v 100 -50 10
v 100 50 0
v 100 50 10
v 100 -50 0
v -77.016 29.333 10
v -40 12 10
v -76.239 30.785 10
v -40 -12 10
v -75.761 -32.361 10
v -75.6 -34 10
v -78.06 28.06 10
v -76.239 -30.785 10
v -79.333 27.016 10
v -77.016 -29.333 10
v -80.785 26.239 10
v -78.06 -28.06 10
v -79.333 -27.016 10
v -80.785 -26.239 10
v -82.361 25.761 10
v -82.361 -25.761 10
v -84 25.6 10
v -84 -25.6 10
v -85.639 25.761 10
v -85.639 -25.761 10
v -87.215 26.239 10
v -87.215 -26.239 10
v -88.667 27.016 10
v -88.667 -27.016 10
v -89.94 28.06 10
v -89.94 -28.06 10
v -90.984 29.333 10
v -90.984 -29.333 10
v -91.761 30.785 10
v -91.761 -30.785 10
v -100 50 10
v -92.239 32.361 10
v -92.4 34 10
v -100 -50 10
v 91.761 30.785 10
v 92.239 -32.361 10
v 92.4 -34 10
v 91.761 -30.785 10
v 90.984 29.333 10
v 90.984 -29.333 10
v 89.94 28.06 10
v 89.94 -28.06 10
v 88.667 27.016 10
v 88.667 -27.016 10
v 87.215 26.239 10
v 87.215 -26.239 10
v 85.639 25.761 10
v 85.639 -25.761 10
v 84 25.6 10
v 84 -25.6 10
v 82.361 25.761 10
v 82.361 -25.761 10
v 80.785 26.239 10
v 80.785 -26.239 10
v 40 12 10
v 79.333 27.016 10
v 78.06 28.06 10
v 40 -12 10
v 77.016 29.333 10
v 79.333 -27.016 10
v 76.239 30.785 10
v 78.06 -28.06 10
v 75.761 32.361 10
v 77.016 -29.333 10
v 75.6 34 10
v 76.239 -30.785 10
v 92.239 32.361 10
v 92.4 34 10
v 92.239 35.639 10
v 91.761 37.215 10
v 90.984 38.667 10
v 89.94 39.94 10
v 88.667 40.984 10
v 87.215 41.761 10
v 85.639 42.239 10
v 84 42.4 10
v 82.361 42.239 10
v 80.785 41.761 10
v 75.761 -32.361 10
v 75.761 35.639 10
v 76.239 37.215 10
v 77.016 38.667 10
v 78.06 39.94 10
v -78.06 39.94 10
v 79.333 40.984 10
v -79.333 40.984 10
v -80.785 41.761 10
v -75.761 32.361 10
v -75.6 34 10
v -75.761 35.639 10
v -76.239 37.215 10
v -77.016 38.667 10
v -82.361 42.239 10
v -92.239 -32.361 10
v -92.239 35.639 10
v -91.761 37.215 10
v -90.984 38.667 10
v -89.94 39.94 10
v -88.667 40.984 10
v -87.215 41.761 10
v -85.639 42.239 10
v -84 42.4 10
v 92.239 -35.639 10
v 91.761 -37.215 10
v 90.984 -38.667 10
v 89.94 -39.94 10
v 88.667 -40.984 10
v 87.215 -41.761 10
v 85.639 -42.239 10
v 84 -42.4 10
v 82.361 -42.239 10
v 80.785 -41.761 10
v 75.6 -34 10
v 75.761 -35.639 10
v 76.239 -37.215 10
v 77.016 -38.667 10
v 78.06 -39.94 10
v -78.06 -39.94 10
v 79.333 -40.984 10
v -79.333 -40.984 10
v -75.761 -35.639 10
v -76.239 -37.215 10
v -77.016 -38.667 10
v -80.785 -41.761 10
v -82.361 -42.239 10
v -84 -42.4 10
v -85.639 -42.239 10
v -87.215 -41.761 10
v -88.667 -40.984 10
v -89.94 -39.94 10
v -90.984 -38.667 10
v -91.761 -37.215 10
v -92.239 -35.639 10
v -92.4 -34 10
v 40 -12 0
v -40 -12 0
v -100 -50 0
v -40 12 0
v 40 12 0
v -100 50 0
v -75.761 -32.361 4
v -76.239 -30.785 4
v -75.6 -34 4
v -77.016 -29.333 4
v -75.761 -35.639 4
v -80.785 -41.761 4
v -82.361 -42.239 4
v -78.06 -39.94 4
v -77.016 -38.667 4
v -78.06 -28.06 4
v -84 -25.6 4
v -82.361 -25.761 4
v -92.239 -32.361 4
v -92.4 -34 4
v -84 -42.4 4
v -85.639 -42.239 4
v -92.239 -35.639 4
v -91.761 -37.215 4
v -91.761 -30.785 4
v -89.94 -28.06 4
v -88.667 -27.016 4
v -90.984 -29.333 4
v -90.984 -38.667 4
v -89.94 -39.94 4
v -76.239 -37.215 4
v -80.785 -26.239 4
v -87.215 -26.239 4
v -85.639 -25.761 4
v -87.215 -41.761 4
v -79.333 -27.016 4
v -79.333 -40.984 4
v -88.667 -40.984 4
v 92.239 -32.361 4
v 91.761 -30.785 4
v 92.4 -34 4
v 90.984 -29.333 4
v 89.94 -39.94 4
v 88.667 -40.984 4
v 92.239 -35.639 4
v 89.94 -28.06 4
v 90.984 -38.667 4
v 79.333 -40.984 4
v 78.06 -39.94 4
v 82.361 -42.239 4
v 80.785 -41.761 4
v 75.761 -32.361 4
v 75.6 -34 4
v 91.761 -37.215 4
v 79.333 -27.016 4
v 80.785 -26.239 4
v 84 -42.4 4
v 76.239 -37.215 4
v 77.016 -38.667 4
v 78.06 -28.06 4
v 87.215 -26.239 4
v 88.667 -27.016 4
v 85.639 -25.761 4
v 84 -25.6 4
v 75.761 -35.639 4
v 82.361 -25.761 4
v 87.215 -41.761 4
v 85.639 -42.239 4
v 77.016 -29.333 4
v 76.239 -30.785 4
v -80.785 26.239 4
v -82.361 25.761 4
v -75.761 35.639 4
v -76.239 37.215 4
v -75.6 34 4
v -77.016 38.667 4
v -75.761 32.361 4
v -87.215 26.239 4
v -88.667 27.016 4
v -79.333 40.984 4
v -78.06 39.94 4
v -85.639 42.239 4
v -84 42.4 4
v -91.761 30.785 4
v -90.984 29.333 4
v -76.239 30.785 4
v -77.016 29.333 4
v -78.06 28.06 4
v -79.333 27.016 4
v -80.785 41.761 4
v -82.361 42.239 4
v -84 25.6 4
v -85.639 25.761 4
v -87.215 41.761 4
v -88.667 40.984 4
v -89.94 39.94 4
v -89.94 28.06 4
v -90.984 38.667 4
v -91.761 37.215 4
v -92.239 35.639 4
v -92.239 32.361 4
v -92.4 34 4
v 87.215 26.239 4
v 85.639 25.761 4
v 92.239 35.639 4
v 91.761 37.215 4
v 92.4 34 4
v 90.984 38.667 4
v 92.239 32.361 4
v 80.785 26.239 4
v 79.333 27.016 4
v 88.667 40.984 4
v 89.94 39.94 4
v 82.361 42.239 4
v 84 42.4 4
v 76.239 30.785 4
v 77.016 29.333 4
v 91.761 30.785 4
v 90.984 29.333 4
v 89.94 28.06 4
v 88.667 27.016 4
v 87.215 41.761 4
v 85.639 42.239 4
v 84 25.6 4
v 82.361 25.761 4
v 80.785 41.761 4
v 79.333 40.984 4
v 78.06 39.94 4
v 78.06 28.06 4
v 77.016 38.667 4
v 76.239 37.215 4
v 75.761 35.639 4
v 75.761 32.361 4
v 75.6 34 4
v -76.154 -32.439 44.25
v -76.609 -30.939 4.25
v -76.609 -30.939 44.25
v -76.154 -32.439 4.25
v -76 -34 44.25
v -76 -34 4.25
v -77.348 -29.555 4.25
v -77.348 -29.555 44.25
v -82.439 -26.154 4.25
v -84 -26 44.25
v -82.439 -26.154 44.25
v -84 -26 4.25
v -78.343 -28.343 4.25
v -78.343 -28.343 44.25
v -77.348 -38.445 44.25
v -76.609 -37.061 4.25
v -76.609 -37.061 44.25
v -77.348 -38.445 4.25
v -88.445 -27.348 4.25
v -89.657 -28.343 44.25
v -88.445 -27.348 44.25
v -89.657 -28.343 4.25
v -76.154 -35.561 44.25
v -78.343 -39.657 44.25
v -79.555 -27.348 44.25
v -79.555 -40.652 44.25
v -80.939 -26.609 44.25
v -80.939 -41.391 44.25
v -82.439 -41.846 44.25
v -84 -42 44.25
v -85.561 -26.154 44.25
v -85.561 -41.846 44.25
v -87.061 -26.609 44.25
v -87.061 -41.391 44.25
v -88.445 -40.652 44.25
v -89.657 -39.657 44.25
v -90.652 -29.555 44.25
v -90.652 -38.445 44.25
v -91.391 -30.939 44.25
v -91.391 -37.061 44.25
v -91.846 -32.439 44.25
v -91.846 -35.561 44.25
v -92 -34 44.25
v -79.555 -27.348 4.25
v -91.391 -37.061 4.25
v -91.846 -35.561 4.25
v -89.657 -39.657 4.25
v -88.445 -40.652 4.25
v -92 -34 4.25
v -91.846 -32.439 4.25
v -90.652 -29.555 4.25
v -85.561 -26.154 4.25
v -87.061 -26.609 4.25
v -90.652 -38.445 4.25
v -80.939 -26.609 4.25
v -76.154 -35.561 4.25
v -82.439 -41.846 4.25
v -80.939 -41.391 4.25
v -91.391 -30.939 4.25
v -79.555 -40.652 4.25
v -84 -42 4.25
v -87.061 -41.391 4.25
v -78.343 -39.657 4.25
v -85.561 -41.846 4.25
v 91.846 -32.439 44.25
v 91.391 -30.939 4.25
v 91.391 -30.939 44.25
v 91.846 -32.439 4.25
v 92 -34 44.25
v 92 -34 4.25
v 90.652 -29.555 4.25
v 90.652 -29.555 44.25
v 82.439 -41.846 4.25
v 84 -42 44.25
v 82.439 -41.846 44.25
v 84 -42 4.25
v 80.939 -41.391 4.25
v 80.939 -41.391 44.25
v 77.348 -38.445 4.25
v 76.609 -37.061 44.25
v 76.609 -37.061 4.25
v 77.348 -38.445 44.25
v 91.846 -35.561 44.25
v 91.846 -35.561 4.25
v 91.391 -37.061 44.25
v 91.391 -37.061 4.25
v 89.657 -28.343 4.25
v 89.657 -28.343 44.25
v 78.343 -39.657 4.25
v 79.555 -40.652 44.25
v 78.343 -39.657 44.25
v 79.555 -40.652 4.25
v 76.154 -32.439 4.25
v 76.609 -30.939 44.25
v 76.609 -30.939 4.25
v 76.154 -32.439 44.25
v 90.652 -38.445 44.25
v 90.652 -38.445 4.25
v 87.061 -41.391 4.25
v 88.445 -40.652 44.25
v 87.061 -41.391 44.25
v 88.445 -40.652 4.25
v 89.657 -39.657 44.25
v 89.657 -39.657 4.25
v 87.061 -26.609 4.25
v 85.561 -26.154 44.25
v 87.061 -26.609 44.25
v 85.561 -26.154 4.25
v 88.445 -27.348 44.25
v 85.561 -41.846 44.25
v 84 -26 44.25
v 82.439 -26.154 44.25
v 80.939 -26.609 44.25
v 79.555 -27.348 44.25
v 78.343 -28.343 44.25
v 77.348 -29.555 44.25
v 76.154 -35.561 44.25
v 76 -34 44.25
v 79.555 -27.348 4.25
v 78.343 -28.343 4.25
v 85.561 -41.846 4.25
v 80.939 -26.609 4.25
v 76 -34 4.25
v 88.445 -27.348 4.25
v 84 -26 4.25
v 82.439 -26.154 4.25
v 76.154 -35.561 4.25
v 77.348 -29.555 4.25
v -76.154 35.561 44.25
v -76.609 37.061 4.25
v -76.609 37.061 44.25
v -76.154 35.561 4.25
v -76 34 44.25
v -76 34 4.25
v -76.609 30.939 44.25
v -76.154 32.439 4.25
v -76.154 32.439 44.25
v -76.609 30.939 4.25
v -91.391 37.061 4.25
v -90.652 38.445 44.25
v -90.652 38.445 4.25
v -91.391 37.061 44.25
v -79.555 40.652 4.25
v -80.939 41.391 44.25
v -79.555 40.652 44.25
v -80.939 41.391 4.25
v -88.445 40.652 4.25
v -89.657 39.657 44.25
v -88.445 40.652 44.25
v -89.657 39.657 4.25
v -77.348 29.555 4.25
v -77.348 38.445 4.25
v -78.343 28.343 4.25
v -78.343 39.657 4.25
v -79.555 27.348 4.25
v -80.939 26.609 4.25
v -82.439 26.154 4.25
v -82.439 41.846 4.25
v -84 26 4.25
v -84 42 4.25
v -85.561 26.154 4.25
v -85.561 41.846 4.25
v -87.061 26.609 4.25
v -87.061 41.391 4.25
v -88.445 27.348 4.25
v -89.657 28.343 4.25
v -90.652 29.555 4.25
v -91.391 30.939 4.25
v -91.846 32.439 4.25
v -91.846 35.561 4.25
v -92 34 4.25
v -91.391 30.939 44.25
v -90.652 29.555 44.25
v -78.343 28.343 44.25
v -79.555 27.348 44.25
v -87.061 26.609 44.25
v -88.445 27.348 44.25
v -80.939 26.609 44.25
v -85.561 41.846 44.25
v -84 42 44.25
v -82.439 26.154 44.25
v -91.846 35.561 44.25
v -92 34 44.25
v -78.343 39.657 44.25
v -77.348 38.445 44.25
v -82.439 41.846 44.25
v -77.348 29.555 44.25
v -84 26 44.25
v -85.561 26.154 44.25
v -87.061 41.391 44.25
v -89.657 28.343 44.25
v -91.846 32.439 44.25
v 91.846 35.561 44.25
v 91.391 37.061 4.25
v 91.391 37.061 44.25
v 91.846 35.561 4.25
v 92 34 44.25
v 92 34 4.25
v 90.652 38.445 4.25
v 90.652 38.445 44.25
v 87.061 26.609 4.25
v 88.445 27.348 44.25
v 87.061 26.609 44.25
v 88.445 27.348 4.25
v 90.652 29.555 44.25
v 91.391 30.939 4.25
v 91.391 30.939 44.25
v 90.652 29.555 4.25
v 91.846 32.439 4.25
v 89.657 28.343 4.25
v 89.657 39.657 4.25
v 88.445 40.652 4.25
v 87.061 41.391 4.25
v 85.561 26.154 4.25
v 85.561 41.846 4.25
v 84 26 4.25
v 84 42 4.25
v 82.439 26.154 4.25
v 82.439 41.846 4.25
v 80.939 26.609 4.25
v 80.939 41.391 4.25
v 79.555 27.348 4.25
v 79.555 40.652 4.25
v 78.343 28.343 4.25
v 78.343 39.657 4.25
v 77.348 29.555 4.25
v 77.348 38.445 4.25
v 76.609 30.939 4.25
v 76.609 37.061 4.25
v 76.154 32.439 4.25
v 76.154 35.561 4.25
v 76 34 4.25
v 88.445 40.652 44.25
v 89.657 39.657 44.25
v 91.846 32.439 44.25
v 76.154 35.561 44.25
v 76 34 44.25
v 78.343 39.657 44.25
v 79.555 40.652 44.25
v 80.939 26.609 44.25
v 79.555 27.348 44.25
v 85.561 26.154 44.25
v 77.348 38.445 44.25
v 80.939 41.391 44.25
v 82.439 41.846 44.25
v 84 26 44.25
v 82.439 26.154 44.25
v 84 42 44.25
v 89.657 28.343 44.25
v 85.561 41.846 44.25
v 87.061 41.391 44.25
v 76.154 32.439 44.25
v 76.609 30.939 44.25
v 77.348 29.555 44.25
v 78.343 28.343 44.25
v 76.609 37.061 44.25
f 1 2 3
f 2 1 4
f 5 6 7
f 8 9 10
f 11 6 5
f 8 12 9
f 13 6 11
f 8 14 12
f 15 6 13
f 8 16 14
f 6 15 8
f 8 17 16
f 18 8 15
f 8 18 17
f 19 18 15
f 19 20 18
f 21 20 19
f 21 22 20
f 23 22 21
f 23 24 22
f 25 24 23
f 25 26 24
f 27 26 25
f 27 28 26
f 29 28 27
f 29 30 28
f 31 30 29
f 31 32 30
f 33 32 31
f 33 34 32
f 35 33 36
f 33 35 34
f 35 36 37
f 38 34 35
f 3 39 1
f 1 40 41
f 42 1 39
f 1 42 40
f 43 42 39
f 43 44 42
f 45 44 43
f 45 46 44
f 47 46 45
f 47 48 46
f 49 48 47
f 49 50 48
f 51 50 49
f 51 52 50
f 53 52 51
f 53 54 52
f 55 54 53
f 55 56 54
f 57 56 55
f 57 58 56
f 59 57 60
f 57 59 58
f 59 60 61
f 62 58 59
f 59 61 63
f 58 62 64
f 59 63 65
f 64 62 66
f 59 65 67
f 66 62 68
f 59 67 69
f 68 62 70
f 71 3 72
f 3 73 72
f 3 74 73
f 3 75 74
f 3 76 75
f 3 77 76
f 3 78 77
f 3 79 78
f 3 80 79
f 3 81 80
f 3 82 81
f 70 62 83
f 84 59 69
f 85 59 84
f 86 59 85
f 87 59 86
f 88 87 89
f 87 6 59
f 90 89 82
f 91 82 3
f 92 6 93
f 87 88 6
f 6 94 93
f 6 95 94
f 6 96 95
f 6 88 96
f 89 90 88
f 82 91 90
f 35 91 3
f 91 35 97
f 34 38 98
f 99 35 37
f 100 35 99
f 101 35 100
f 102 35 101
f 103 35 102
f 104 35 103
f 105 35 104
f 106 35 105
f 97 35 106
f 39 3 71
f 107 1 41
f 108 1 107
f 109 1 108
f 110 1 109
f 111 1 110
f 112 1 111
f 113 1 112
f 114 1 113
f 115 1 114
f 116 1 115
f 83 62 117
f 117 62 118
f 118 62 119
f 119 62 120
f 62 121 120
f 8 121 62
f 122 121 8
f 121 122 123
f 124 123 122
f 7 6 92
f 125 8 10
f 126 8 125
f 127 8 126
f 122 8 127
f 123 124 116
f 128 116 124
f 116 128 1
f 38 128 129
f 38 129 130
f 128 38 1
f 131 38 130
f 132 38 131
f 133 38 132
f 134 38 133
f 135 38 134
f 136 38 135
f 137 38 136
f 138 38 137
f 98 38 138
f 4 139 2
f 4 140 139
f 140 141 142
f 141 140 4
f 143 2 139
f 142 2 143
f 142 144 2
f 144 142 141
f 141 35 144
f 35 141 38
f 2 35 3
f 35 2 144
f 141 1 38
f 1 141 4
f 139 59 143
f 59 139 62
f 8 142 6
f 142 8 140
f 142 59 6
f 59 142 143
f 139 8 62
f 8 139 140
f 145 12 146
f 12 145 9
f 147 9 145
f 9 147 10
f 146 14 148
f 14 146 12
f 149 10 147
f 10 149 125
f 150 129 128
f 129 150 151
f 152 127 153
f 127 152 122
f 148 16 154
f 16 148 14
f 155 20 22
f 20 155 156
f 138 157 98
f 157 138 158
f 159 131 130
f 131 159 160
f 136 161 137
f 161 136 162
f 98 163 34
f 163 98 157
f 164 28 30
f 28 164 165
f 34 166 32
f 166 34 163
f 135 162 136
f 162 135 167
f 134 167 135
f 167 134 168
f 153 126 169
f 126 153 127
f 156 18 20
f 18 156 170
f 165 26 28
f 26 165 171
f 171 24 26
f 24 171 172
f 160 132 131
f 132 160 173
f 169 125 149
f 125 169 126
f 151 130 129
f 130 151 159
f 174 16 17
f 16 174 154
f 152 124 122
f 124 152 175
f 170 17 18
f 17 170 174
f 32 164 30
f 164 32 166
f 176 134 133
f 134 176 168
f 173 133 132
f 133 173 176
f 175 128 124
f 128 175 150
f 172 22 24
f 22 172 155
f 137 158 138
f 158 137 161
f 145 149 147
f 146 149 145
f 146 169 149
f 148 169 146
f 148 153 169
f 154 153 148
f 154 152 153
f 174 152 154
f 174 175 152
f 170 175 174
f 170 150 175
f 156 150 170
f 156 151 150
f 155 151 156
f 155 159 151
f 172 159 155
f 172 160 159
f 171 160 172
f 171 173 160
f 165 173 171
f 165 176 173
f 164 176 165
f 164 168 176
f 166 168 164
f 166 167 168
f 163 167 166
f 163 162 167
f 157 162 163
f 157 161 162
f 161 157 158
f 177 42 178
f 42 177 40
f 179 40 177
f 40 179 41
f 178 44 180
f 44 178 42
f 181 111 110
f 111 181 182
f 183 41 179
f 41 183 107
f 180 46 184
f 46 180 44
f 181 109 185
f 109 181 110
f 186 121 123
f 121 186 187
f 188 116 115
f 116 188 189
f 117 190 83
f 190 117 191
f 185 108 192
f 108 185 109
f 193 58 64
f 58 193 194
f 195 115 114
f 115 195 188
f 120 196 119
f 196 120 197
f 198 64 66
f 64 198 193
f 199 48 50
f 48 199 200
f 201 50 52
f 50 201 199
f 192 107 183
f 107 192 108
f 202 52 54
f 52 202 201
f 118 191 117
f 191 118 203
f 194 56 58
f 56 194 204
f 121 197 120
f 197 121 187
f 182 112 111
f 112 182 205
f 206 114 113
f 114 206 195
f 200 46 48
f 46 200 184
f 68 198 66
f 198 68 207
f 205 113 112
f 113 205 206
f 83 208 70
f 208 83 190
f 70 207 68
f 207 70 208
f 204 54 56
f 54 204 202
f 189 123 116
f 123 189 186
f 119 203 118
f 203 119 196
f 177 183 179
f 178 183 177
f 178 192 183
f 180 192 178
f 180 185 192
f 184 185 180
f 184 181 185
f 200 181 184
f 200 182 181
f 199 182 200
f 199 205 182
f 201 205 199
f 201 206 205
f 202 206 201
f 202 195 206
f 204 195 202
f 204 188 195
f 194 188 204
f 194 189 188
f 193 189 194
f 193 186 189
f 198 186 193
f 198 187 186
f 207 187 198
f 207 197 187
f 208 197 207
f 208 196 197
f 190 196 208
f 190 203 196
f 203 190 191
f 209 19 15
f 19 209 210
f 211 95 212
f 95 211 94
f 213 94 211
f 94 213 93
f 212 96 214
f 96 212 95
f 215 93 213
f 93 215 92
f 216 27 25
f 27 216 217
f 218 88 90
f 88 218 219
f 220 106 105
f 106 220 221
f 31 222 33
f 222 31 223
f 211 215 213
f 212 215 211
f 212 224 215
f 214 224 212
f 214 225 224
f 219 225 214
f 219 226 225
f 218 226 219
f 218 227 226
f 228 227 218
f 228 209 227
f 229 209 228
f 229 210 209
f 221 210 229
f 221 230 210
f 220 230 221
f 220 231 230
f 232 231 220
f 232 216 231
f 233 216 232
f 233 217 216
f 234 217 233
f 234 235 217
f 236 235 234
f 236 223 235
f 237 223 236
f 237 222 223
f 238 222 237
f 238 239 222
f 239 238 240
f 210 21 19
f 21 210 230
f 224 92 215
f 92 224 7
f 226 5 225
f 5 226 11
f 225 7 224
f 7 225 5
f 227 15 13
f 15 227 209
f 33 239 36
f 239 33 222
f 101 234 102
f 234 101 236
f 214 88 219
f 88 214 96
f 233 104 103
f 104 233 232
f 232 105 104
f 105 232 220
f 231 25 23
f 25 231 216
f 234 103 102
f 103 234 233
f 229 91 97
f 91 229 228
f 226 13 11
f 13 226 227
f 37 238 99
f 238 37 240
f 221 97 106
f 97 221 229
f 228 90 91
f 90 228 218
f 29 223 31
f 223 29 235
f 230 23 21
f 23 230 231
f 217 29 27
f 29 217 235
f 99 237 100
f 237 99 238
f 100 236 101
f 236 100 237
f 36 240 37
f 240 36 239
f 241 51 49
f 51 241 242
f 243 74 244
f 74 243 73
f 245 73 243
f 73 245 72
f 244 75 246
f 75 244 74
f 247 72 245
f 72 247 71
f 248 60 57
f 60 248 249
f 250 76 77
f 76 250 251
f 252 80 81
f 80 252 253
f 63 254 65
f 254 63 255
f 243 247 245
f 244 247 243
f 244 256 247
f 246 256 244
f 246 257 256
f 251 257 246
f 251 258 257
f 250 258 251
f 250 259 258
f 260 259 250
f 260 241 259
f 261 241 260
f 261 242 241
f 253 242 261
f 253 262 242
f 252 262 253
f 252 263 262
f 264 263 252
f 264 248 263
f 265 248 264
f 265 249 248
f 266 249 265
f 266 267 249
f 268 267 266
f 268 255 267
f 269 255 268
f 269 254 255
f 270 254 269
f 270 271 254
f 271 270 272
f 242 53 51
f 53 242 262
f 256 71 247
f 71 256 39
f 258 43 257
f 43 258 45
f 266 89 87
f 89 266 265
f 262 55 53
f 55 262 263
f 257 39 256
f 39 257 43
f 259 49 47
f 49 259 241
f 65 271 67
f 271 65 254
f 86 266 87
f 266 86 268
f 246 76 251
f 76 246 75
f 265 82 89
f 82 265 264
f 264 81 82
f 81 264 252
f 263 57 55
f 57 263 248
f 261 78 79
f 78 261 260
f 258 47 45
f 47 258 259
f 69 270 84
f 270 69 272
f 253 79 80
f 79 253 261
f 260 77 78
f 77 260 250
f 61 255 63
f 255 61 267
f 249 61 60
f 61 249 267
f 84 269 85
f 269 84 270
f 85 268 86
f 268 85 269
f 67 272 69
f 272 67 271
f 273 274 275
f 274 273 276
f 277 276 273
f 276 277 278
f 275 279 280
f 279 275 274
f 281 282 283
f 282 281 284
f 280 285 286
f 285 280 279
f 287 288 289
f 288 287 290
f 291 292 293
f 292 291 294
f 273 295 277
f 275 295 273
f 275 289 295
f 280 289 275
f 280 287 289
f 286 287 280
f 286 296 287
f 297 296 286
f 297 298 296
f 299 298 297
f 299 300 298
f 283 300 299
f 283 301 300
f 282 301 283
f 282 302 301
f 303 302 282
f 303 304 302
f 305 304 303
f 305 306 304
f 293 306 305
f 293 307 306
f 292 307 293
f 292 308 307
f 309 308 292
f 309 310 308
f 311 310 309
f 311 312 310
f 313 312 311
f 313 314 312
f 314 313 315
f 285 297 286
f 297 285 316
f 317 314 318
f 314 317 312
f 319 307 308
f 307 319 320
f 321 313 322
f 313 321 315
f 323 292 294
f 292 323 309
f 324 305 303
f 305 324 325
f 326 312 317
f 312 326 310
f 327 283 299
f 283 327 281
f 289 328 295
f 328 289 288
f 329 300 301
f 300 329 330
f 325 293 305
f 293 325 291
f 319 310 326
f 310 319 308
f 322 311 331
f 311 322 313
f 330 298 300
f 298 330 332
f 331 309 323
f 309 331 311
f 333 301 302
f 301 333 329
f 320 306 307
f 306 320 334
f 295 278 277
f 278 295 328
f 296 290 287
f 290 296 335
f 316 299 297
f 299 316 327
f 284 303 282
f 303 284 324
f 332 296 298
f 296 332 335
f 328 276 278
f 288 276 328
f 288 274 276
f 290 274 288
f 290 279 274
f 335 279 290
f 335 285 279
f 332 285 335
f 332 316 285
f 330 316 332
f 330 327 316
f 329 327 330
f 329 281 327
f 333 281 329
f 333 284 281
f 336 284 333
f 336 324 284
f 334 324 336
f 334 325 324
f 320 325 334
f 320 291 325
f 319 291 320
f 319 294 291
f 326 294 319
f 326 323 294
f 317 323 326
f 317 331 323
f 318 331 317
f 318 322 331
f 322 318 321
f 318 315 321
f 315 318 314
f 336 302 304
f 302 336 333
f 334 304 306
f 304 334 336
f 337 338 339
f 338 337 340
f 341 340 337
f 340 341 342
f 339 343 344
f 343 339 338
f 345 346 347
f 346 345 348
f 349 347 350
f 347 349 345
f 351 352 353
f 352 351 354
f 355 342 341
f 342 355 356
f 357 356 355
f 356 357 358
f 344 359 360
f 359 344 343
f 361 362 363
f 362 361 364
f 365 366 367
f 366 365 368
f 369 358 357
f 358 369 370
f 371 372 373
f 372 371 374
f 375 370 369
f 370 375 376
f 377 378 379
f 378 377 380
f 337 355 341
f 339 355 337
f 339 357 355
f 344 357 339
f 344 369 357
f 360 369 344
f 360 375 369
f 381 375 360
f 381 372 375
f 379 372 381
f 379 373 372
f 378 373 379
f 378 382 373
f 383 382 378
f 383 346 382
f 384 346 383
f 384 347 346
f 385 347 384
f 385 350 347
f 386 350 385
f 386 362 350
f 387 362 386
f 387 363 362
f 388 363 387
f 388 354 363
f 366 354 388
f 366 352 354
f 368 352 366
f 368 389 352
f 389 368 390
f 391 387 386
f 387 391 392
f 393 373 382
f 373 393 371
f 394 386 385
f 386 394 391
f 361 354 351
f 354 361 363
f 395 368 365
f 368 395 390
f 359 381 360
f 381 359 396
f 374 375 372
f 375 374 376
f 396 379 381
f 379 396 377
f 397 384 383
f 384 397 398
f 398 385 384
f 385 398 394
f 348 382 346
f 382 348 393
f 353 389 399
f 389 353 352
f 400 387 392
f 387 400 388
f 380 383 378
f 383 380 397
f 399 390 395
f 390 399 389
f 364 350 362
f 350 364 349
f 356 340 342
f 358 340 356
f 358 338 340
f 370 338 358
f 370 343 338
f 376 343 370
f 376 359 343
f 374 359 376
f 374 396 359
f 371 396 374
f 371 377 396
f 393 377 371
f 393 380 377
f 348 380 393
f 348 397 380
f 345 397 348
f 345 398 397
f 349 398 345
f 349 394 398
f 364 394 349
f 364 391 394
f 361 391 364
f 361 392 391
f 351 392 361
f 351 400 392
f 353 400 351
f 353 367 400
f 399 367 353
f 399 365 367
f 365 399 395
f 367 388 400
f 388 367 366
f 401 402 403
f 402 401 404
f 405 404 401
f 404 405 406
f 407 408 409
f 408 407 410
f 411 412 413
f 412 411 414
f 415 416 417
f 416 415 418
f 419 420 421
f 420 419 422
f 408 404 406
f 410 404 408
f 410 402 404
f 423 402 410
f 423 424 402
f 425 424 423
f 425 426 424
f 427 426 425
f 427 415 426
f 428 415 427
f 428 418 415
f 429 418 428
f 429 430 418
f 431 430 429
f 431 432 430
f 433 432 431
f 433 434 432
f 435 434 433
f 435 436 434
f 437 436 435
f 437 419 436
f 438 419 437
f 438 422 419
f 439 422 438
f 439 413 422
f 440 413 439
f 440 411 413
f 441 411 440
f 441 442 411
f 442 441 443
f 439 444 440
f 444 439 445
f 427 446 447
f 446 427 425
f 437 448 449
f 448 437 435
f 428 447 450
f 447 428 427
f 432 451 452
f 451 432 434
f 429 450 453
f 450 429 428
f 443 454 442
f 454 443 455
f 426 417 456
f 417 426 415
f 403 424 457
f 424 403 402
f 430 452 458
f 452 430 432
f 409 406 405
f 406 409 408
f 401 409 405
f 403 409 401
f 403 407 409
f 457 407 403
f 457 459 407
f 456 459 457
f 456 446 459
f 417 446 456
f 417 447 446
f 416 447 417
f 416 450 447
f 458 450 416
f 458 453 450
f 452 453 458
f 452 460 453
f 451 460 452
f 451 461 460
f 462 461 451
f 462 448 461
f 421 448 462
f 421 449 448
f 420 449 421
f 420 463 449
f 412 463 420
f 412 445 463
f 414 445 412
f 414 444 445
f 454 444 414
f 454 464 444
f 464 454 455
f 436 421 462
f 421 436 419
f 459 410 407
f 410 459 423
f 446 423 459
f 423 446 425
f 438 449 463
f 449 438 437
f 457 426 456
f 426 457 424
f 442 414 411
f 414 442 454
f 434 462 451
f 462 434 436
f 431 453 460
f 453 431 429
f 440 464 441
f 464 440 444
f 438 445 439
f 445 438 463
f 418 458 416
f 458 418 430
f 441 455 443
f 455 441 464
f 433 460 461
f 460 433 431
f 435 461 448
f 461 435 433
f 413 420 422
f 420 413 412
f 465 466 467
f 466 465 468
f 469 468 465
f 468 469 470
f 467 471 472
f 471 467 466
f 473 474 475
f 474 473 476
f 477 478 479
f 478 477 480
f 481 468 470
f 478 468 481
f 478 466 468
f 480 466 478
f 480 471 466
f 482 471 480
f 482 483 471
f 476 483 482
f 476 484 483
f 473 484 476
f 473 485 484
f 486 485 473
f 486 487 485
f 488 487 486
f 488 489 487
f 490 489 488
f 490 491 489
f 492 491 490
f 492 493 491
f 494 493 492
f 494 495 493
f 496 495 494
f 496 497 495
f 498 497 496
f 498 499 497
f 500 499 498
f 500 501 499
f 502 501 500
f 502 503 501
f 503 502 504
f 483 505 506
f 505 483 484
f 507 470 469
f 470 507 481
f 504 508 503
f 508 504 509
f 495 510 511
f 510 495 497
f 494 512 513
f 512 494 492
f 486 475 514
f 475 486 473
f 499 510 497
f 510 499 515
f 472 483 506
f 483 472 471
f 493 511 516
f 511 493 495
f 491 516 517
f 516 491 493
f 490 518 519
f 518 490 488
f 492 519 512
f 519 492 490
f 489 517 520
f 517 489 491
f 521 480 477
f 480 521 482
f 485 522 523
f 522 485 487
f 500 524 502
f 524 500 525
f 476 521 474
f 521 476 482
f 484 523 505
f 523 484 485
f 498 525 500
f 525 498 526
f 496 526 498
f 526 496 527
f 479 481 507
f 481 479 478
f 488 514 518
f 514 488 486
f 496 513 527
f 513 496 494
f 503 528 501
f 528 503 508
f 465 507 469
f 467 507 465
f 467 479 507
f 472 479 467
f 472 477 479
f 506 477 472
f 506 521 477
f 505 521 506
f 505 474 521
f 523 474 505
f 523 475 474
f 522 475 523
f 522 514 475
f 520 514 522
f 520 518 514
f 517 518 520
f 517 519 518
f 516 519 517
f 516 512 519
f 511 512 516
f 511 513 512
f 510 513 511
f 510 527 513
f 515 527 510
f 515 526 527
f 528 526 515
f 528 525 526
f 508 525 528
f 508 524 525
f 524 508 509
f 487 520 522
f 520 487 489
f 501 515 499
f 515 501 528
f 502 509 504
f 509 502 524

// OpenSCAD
$fn = 32;

// ------------------------------------------------------------------------
// Frame with four posts: 200 x 100 mm frame, four d16 posts
// Every part is its own module, assembly() places them once.
// ------------------------------------------------------------------------

// --- part 1 ---
module base_frame() {
  difference() {
    translate([-100, -50, 0]) cube([200, 100, 10]);
    translate([-40, -12, -1]) cube([80, 24, 12]);
    translate([-84, -34, 4]) cylinder(h = 7, d = 16.8);
    translate([84, -34, 4]) cylinder(h = 7, d = 16.8);
    translate([-84, 34, 4]) cylinder(h = 7, d = 16.8);
    translate([84, 34, 4]) cylinder(h = 7, d = 16.8);
  }
}

// --- part 2 ---
module post1() {
  cylinder(h = 40, d = 16);
}

// --- part 3 ---
module post2() {
  cylinder(h = 40, d = 16);
}

// --- part 4 ---
module post3() {
  cylinder(h = 40, d = 16);
}

// --- part 5 ---
module post4() {
  cylinder(h = 40, d = 16);
}

// --- assembly ---
module assembly() {
  translate([0, 0, 0]) rotate([0, 0, 0]) base_frame();
  translate([-84, -34, 4.25]) rotate([0, 0, 0]) post1();
  translate([84, -34, 4.25]) rotate([0, 0, 0]) post2();
  translate([-84, 34, 4.25]) rotate([0, 0, 0]) post3();
  translate([84, 34, 4.25]) rotate([0, 0, 0]) post4();
}

assembly();
